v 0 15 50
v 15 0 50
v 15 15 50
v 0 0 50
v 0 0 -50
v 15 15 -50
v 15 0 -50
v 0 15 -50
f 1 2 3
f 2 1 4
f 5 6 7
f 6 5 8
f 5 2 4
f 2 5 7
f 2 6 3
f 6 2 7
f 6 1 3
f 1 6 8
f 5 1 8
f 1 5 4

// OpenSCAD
$fn=64;

module extrusion_15x15(length=100, size=15) {
    translate([0,0,-length/2])
        cube([size, size, length], center=false);
}

extrusion_15x15(100, 15);
